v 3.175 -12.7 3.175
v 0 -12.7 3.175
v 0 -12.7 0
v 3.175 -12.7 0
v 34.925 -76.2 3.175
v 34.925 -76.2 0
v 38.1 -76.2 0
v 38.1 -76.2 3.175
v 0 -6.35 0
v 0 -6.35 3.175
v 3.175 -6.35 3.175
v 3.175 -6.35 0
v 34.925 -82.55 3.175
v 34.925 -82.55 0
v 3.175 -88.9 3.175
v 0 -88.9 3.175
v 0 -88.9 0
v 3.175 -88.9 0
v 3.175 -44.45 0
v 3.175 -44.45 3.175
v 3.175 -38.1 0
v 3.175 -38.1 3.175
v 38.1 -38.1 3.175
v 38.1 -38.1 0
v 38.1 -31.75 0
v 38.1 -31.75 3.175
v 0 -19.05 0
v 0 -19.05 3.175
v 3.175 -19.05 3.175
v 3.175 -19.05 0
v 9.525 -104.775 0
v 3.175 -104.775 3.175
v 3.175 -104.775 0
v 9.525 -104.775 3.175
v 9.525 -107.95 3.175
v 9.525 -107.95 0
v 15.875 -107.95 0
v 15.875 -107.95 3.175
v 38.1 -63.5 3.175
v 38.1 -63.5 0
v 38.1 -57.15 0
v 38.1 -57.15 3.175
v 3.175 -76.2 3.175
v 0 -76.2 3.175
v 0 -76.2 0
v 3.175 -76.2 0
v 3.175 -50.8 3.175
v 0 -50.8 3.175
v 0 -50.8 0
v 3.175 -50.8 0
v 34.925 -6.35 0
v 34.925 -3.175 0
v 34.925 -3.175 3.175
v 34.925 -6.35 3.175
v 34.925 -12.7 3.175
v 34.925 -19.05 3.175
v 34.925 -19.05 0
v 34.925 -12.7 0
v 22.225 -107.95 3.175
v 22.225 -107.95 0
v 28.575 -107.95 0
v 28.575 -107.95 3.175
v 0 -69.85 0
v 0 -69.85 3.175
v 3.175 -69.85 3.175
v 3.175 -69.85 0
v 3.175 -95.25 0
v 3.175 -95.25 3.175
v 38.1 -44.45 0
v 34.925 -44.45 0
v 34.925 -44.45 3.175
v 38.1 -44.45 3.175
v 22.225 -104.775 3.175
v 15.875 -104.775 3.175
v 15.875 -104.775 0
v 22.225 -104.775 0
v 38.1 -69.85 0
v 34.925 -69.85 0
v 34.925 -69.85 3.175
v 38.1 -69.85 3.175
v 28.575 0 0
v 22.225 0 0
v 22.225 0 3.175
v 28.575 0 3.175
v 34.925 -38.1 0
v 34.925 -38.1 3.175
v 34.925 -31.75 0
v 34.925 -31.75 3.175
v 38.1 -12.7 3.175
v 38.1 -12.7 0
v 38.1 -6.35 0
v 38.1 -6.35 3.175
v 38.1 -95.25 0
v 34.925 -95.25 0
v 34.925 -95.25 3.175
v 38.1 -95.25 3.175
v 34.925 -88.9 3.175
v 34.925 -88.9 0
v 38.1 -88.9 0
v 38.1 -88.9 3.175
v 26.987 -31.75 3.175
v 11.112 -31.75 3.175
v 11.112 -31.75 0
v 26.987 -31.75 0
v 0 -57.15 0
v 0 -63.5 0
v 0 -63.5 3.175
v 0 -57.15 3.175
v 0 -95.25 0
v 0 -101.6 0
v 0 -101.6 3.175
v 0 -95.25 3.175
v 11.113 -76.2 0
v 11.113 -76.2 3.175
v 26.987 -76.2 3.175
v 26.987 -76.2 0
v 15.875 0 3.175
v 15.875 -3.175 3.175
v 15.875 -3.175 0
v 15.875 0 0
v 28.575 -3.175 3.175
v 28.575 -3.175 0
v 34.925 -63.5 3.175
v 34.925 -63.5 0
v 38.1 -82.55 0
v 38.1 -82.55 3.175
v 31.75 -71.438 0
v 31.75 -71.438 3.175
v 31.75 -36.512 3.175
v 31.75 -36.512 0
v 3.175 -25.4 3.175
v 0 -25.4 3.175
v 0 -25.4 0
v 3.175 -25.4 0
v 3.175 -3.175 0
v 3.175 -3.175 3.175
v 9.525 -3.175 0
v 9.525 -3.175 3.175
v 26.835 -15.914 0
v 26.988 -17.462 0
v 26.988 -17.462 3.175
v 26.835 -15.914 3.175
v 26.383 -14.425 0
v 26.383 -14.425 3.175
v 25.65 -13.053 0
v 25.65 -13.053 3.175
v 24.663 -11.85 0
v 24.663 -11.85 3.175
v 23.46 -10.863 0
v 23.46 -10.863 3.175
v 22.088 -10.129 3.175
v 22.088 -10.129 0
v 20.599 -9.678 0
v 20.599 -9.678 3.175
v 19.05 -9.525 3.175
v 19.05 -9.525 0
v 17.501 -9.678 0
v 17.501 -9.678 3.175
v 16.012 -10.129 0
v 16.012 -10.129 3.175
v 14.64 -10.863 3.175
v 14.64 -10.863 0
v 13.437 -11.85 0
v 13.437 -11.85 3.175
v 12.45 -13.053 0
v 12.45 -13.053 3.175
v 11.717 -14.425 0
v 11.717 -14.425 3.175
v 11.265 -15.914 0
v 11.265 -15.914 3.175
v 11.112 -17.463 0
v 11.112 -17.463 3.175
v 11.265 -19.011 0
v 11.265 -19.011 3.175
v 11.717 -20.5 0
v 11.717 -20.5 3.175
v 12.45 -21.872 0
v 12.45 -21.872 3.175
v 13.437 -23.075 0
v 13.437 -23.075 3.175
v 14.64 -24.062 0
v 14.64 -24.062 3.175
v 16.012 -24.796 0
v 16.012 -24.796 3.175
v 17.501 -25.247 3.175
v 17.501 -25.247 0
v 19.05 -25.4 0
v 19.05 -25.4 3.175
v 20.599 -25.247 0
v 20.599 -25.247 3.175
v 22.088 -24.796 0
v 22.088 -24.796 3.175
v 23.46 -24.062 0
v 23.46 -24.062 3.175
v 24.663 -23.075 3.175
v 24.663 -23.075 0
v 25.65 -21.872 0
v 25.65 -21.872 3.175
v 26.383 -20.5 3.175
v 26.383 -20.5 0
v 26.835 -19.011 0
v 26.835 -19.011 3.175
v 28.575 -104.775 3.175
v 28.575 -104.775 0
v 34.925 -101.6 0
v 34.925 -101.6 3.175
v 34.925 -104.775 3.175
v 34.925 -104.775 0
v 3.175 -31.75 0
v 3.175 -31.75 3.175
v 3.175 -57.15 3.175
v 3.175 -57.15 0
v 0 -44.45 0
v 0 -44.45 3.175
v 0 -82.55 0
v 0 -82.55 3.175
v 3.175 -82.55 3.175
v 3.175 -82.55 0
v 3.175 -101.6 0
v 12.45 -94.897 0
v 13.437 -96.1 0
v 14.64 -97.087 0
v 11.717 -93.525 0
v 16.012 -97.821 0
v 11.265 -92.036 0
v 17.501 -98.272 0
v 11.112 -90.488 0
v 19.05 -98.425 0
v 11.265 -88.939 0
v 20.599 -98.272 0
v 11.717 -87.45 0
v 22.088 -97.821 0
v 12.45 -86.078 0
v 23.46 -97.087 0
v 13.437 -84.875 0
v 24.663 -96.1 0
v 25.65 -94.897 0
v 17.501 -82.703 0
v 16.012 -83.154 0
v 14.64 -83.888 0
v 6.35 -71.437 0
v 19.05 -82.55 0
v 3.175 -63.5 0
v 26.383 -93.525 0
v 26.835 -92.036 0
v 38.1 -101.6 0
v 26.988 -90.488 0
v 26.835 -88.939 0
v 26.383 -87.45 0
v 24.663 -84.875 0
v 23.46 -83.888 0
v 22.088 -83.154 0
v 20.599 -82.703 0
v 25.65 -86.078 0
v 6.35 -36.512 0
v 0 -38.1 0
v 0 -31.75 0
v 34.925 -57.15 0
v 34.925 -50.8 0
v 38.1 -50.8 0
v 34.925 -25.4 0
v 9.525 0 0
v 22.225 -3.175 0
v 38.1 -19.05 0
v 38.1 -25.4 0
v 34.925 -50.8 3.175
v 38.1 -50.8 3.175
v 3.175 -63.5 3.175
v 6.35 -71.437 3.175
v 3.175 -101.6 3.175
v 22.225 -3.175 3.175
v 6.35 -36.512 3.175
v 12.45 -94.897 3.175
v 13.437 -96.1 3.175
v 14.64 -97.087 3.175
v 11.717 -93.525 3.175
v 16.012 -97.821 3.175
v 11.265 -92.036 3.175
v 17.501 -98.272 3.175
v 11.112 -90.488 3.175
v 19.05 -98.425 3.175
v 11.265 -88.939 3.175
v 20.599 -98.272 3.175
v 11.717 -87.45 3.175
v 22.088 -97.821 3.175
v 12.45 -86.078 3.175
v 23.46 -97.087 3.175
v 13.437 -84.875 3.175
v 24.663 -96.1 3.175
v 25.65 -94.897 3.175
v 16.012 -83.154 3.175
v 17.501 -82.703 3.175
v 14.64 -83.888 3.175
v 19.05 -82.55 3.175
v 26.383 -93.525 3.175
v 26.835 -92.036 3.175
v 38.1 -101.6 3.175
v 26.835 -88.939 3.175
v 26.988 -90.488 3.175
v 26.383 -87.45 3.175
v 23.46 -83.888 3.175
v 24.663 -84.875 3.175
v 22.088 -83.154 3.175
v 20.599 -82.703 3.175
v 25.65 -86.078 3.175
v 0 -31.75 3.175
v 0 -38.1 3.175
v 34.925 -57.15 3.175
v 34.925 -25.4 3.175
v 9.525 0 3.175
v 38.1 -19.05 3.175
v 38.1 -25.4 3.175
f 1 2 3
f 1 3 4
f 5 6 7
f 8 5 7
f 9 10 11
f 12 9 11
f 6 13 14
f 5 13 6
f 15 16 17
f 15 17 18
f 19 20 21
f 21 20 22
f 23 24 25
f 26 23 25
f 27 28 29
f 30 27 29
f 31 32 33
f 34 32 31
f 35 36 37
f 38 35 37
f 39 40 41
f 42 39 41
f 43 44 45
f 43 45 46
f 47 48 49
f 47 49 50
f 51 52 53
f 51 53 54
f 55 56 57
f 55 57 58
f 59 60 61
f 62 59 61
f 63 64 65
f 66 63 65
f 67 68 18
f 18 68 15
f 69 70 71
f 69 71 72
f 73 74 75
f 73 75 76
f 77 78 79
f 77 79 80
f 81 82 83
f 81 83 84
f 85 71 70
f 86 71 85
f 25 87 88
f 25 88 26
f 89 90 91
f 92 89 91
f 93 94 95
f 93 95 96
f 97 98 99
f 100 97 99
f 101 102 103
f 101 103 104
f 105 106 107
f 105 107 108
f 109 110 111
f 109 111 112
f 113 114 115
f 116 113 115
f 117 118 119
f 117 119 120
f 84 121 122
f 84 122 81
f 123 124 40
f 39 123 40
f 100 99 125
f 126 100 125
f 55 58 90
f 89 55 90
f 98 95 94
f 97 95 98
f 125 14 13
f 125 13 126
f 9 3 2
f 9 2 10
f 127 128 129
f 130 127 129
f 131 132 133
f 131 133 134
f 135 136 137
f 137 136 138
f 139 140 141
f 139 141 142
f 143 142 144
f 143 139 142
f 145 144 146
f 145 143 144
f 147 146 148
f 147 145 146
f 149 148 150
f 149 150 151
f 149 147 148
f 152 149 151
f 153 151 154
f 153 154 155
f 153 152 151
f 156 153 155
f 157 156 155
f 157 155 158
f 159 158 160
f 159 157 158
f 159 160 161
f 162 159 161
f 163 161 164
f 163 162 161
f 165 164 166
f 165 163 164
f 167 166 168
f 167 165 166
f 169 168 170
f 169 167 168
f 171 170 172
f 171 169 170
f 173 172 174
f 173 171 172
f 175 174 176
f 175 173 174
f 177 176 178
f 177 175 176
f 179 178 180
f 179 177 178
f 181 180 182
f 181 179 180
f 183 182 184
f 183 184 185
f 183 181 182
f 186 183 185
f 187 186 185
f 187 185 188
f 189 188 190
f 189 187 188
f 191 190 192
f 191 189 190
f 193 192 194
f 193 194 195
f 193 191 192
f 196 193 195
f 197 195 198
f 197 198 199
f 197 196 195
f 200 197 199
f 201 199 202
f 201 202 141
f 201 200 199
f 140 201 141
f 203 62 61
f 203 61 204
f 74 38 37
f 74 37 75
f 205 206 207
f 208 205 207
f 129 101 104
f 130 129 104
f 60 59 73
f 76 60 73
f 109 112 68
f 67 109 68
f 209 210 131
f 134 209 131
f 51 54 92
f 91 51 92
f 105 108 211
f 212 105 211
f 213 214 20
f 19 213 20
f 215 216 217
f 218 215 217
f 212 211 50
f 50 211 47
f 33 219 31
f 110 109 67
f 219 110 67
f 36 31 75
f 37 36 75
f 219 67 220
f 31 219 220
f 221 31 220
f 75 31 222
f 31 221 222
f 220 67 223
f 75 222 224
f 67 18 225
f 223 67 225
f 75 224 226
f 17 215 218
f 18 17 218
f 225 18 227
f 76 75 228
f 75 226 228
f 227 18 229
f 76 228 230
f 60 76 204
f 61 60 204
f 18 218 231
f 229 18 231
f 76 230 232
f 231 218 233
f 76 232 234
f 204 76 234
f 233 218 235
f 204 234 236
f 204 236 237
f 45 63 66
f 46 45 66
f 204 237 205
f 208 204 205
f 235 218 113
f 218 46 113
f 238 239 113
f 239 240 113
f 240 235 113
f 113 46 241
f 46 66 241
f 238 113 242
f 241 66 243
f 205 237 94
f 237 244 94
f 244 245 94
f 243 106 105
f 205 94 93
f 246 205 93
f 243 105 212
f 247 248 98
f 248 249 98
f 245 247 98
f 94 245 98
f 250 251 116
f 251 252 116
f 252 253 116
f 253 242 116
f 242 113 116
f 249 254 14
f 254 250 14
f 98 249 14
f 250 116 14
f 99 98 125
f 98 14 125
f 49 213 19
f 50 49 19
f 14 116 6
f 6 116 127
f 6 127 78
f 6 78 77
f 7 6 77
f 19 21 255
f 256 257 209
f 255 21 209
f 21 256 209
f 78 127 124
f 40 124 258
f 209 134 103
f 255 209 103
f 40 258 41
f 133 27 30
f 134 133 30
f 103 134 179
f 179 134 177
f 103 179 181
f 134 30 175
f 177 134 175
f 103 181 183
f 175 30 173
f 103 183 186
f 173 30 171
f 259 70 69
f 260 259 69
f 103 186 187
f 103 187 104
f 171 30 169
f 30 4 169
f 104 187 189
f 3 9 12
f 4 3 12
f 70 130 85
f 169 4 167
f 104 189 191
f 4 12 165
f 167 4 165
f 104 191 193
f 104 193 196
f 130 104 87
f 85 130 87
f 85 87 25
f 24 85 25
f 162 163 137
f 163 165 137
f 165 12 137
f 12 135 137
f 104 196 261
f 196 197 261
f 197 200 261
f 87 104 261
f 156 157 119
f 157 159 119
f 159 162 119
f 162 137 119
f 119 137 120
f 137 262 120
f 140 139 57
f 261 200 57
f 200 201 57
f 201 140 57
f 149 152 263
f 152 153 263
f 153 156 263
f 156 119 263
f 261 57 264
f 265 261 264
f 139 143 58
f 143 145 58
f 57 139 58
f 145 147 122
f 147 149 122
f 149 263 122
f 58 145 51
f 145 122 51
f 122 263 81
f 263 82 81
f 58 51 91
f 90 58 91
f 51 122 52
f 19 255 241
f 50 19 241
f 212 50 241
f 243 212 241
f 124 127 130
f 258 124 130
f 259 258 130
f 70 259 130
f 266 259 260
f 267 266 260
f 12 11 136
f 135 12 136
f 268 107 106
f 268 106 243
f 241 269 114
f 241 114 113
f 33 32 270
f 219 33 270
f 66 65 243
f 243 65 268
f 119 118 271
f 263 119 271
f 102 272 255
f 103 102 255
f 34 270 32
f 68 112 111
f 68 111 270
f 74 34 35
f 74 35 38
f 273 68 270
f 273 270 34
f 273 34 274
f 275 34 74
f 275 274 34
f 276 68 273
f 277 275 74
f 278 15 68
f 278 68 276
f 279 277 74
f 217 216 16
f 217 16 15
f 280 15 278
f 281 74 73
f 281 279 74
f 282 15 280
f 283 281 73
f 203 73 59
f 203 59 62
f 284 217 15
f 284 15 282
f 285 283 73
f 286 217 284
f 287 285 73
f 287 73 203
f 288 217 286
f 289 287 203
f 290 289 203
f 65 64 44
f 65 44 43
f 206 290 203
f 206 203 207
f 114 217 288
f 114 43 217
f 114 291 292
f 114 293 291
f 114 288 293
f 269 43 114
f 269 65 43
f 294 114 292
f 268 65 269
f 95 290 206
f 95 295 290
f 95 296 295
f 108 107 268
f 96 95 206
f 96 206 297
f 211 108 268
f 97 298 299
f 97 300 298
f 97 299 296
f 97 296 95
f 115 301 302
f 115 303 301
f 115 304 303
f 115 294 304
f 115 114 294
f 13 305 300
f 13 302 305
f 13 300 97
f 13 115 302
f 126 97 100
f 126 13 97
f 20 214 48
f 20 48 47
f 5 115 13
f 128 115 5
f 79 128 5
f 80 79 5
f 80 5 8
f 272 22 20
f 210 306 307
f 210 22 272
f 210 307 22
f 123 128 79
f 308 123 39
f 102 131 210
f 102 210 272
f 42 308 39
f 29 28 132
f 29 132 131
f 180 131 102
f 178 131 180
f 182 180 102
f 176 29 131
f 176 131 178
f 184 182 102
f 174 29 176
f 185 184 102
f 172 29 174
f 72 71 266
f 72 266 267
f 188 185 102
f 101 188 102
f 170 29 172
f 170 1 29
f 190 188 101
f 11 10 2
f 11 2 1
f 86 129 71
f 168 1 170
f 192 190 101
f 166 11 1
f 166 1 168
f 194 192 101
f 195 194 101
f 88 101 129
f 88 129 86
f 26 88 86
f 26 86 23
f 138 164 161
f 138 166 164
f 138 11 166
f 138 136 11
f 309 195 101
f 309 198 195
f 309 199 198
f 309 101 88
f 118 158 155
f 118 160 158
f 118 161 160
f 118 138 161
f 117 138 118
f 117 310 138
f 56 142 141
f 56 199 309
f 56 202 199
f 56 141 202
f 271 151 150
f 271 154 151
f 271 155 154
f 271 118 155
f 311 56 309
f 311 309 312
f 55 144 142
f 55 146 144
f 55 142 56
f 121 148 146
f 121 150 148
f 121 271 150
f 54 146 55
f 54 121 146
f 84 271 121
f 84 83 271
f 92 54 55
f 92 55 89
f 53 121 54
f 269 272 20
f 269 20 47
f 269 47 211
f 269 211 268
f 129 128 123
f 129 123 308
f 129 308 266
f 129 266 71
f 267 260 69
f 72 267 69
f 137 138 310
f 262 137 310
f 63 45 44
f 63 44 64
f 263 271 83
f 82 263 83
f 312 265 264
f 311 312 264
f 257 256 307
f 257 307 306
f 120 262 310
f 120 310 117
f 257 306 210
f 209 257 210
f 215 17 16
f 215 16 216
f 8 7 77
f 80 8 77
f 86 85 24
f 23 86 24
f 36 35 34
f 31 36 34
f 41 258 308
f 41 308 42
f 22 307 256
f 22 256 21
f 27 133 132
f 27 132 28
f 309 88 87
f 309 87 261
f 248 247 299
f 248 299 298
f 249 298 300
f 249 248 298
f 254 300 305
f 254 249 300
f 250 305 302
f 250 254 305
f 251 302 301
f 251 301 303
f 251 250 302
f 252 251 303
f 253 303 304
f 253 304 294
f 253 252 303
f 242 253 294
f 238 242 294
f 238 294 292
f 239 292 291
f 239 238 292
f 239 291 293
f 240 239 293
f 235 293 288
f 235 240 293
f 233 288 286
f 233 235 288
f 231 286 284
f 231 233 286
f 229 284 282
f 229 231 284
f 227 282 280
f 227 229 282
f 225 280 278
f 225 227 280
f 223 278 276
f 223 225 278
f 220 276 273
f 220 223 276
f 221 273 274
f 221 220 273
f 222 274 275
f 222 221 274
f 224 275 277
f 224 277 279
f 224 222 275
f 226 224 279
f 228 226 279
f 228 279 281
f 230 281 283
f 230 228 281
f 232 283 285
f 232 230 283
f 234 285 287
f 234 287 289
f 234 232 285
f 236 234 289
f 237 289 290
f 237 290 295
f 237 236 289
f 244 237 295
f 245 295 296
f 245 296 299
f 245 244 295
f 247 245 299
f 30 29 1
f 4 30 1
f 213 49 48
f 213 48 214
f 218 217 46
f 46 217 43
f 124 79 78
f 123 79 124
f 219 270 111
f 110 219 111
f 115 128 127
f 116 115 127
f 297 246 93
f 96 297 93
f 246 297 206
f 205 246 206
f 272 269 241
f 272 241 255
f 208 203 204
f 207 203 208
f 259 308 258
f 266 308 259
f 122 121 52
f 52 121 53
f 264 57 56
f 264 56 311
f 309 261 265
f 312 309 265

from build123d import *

# Parameters (mm, degrees)
F0_W     = 38.1
F0_H     = 107.95
F0_R     = 7.9375
F1_DEPTH = 3.175
F2_W     = 6.35
F2_H     = 3.175
F2_W_2   = 3.175
F2_H_2   = 6.35
F2_W_3   = 25.4
F2_H_3   = 44.45
F3_DEPTH = 3.175
F4_SIZE  = 4.7625


with BuildPart() as f1:
    # F0 (on Top) → F1 (new body)
    with BuildSketch(Plane.XY):
        with Locations((19.05, -53.975)):
            Rectangle(F0_W, F0_H)
        with Locations((19.05, -90.4875)):
            Circle(F0_R, mode=Mode.SUBTRACT)
        with Locations((19.05, -17.4625)):
            Circle(F0_R, mode=Mode.SUBTRACT)
    extrude(amount=F1_DEPTH)

    # F2 (on face) → F3 (cut, through all)
    with BuildSketch(Plane.XY.offset(3.175)):
        Polygon((38.1, -6.35), (38.1, 0), (34.925, 0), (34.925, -3.175), (34.925, -6.35), align=None)
        with Locations((31.75, -1.5875)):
            Rectangle(F2_W, F2_H)
        Polygon((3.175, 0), (0, 0), (0, -6.35), (3.175, -6.35), (3.175, -3.175), align=None)
        with Locations((6.35, -1.5875)):
            Rectangle(F2_W, F2_H)
        with Locations((1.5875, -15.875)):
            Rectangle(F2_W_2, F2_H_2)
        with Locations((36.5125, -15.875)):
            Rectangle(F2_W_2, F2_H_2)
        with Locations((36.5125, -28.575)):
            Rectangle(F2_W_2, F2_H_2)
        with Locations((36.5125, -41.275)):
            Rectangle(F2_W_2, F2_H_2)
        with Locations((36.5125, -53.975)):
            Rectangle(F2_W_2, F2_H_2)
        with Locations((36.5125, -66.675)):
            Rectangle(F2_W_2, F2_H_2)
        with Locations((36.5125, -79.375)):
            Rectangle(F2_W_2, F2_H_2)
        with Locations((36.5125, -92.075)):
            Rectangle(F2_W_2, F2_H_2)
        Polygon((38.1, -101.6), (34.925, -101.6), (34.925, -104.775), (34.925, -107.95), (38.1, -107.95), align=None)
        with Locations((31.75, -106.3625)):
            Rectangle(F2_W, F2_H)
        with Locations((36.5125, -117.475)):
            Rectangle(F2_W_2, F2_H_2)
        with Locations((36.5125, -130.175)):
            Rectangle(F2_W_2, F2_H_2)
        with Locations((1.5875, -28.575)):
            Rectangle(F2_W_2, F2_H_2)
        with Locations((1.5875, -41.275)):
            Rectangle(F2_W_2, F2_H_2)
        with Locations((1.5875, -53.975)):
            Rectangle(F2_W_2, F2_H_2)
        with Locations((1.5875, -66.675)):
            Rectangle(F2_W_2, F2_H_2)
        with Locations((1.5875, -79.375)):
            Rectangle(F2_W_2, F2_H_2)
        with Locations((1.5875, -92.075)):
            Rectangle(F2_W_2, F2_H_2)
        Polygon((3.175, -104.775), (3.175, -101.6), (0, -101.6), (0, -107.95), (3.175, -107.95), align=None)
        with Locations((6.35, -106.3625)):
            Rectangle(F2_W, F2_H)
        with Locations((1.5875, -117.475)):
            Rectangle(F2_W_2, F2_H_2)
        with Locations((1.5875, -130.175)):
            Rectangle(F2_W_2, F2_H_2)
        with Locations((19.05, -53.975)):
            Rectangle(F2_W_3, F2_H_3)
        with Locations((19.05, -1.5875)):
            Rectangle(F2_W, F2_H)
        with Locations((19.05, -106.3625)):
            Rectangle(F2_W, F2_H)
    extrude(amount=-F3_DEPTH, mode=Mode.SUBTRACT)

    # F4
    f4_edges = [f1.edges().sort_by_distance(p)[0] for p in [
        (31.75, -31.75, 1.5875),
        (31.75, -76.2, 1.5875),
        (6.35, -76.2, 1.5875),
        (6.35, -31.75, 1.5875),
    ]]
    chamfer(f4_edges, length=F4_SIZE)


solid = f1.part
